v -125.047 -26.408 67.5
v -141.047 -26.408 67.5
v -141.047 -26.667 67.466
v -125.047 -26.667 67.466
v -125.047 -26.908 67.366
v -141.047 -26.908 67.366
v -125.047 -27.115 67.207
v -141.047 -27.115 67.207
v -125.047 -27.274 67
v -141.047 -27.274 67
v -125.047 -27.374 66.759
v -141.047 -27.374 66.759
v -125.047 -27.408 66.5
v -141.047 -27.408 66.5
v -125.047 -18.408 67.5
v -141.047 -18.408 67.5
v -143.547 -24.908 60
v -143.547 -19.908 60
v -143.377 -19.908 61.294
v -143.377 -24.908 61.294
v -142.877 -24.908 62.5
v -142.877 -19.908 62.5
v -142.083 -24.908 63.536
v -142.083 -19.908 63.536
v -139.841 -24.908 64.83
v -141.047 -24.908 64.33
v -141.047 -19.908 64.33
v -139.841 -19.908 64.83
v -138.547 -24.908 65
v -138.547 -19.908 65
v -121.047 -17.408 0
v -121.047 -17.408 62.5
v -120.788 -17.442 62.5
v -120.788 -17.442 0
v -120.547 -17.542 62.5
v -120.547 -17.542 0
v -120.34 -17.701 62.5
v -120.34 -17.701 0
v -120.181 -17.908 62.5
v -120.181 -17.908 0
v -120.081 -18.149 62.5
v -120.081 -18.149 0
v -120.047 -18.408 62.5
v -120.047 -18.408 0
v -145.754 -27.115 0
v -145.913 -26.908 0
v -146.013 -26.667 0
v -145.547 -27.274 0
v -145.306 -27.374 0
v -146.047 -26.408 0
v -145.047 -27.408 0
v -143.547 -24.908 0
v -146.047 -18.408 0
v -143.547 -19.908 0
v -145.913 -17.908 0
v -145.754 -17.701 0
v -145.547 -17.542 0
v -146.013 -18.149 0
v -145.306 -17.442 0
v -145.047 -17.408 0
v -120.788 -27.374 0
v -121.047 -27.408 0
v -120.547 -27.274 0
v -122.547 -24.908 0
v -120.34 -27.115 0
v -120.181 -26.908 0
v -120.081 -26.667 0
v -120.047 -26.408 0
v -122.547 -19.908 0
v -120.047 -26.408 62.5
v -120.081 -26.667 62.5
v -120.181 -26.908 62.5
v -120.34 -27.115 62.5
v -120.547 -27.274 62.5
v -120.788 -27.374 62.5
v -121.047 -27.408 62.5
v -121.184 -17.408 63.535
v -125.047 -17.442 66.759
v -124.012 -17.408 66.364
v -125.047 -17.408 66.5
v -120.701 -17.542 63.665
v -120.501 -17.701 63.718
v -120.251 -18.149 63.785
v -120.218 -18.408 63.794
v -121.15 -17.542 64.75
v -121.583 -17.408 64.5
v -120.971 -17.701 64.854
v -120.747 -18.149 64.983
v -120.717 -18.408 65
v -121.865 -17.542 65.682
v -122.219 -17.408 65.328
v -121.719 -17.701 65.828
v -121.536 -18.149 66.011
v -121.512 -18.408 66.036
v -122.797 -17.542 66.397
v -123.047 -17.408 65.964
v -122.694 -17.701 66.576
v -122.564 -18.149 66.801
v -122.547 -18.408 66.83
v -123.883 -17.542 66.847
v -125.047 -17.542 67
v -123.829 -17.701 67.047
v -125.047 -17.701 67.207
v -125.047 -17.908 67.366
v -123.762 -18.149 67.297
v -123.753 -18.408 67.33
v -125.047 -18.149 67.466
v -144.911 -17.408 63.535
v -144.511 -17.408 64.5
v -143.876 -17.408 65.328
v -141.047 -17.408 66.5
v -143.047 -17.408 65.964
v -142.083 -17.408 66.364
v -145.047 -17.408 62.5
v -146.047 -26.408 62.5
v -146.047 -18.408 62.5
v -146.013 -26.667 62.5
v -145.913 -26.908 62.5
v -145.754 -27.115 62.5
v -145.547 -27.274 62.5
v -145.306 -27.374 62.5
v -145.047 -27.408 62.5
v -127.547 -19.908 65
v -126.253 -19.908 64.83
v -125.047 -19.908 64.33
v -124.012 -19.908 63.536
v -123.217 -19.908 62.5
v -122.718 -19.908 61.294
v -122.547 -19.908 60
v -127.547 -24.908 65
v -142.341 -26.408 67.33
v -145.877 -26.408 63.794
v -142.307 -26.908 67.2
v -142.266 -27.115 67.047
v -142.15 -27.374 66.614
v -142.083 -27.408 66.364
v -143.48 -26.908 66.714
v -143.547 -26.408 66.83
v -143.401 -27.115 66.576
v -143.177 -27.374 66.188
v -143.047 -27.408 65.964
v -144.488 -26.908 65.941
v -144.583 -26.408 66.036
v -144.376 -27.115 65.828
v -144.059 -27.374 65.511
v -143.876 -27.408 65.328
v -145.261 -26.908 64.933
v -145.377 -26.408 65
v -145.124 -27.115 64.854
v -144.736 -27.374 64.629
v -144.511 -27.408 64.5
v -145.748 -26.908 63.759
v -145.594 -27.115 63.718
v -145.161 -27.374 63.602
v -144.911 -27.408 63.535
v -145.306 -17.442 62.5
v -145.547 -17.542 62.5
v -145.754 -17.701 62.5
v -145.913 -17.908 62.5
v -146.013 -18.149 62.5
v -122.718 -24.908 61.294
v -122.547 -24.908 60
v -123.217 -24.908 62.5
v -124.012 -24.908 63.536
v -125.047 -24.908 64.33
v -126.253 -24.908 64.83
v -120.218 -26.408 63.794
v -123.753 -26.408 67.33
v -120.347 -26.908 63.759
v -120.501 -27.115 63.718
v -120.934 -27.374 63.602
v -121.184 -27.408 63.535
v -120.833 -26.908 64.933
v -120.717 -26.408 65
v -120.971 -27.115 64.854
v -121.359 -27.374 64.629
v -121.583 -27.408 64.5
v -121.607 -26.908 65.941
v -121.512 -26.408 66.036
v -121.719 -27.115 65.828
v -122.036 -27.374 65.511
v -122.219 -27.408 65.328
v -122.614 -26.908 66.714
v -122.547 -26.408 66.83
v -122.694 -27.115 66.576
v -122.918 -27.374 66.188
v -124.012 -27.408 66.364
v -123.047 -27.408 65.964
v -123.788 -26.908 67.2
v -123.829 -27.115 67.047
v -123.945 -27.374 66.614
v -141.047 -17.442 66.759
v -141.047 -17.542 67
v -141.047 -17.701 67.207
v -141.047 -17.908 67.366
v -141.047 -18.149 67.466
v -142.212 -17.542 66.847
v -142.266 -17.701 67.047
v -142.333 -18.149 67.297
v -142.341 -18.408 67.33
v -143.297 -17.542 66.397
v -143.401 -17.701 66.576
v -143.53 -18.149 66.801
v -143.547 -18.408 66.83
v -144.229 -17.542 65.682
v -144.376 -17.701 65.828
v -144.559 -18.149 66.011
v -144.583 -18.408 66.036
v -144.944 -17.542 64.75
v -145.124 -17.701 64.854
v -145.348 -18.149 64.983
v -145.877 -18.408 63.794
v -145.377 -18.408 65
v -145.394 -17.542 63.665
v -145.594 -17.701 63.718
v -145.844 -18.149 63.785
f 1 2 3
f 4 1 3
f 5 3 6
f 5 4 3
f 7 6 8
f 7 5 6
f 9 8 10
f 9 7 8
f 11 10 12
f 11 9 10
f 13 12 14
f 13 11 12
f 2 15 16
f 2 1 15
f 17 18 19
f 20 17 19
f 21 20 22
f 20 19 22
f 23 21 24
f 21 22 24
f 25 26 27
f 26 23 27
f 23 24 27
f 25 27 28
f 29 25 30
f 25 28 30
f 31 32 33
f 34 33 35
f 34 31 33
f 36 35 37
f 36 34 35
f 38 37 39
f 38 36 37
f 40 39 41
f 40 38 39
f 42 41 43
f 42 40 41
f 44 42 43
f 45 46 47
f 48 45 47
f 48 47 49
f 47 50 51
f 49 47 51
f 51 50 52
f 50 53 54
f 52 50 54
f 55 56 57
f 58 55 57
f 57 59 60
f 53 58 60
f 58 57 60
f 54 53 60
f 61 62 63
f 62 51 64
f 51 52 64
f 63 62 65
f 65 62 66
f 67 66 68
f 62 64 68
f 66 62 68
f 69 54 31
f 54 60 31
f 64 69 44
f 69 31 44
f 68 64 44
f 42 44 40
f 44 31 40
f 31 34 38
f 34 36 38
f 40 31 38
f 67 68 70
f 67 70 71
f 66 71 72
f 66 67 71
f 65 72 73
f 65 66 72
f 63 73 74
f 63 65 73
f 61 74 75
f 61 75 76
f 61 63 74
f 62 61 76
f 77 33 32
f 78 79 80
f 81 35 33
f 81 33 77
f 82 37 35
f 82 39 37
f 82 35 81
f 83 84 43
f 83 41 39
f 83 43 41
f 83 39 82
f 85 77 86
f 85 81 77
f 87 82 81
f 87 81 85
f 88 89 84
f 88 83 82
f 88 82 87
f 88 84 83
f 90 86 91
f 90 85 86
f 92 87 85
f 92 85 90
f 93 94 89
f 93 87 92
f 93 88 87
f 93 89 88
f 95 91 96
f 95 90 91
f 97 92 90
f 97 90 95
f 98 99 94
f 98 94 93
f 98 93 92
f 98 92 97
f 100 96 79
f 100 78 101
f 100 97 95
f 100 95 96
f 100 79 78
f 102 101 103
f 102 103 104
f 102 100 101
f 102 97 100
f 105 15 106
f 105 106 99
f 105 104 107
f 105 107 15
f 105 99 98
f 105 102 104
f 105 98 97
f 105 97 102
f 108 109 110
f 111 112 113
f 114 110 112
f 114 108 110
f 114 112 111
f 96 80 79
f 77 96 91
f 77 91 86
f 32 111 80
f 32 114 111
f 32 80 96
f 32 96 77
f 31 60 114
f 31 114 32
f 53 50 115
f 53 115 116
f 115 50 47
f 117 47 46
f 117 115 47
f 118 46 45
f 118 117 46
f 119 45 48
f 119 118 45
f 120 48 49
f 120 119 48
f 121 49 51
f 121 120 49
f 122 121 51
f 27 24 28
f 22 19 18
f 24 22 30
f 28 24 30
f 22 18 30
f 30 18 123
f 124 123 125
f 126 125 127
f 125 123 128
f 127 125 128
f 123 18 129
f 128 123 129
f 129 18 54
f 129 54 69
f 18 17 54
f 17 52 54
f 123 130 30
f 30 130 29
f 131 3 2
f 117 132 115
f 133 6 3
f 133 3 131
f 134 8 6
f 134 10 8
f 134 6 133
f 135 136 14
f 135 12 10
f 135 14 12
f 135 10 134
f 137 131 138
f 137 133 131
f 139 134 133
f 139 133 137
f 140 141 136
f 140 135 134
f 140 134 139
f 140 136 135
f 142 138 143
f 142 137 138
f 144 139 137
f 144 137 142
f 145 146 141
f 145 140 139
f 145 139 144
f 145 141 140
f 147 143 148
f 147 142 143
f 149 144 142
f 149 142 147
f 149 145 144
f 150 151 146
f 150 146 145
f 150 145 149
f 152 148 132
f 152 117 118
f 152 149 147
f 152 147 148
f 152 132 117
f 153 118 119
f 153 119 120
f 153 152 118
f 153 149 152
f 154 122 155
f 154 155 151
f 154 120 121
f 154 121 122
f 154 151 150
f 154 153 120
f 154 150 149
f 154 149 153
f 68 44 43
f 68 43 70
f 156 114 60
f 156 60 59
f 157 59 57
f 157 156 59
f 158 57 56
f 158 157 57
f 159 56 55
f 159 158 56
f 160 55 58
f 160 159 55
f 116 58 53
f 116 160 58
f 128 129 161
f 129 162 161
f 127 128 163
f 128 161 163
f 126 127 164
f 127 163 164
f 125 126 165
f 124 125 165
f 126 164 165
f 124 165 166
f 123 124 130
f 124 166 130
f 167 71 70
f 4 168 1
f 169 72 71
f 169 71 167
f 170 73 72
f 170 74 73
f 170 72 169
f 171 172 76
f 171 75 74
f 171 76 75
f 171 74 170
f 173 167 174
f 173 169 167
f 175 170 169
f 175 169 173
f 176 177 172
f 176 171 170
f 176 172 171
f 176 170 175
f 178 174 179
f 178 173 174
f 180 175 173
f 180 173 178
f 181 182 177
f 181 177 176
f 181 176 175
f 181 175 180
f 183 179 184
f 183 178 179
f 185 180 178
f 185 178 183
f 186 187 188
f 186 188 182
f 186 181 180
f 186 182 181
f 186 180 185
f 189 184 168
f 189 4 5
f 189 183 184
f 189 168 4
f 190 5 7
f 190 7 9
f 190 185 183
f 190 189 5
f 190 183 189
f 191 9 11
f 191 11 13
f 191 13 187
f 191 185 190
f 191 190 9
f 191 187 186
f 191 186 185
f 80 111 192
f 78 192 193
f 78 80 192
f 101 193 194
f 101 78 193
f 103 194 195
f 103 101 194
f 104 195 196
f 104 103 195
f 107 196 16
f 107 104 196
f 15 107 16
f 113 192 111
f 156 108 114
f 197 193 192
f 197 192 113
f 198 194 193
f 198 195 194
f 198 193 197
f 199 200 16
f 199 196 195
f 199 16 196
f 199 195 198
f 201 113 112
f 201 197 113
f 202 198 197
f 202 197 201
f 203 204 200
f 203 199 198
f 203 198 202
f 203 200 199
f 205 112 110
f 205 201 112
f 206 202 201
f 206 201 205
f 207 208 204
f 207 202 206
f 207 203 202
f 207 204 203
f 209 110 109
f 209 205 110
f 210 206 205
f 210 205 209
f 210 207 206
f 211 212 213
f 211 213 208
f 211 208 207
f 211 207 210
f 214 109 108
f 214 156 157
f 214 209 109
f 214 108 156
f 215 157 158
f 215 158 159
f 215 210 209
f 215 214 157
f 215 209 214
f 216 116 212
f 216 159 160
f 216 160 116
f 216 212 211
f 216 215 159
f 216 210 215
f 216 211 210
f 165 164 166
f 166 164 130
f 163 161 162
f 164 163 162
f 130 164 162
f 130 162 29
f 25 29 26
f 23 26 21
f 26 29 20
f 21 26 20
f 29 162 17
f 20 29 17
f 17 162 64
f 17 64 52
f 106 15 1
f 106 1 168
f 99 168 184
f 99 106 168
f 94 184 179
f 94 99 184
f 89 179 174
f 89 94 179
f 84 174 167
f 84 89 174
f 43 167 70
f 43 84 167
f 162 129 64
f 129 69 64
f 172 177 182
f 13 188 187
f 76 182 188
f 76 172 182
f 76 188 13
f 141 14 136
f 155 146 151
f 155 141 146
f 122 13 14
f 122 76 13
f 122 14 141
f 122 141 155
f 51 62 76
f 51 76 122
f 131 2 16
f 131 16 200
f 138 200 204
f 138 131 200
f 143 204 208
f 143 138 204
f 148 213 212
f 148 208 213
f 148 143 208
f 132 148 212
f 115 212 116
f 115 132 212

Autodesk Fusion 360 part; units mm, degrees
sketch "草图1" plane through (0, 0, 0) normal (0, 0, 1) x (1, 0, 0)
  line L0 (-122.5473, -24.9077) -> (-143.5473, -24.9077)
  line L1 (-143.5473, -24.9077) -> (-143.5473, -19.9077)
  line L2 (-143.5473, -19.9077) -> (-122.5473, -19.9077)
  line L3 (-122.5473, -19.9077) -> (-122.5473, -24.9077)
  line L4 (-146.0473, -17.4077) -> (-120.0473, -17.4077)
  line L5 (-120.0473, -17.4077) -> (-120.0473, -27.4077)
  line L6 (-120.0473, -27.4077) -> (-146.0473, -27.4077)
  line L7 (-146.0473, -27.4077) -> (-146.0473, -17.4077)
  line L8 (-146.0473, -17.4077) -> (-120.0473, -27.4077) construction
  line L9 (-120.0473, -17.4077) -> (-146.0473, -27.4077) construction
  point P0 (-133.0473, -22.4077)
  dimension "d1" = 21
  dimension "d2" = 5
  dimension "d3" = 26
  dimension "d4" = 10
extrude "拉伸1" add sketch "草图1" along normal blind 65
sketch "草图2" plane through (0, 0, 65) normal (0, 0, 1) x (-1, 0, 0)
  line L0 (143.5473, 19.9077) -> (122.5473, 19.9077)
  line L1 (122.5473, 19.9077) -> (122.5473, 24.9077)
  line L2 (122.5473, 24.9077) -> (143.5473, 24.9077)
  line L3 (143.5473, 24.9077) -> (143.5473, 19.9077)
  line L4 (146.0473, 27.4077) -> (120.0473, 27.4077)
  line L5 (120.0473, 27.4077) -> (120.0473, 17.4077)
  line L6 (120.0473, 17.4077) -> (146.0473, 17.4077)
  line L7 (146.0473, 17.4077) -> (146.0473, 27.4077)
  line L8 (120.0473, 27.4077) -> (146.0473, 27.4077)
  line L9 (146.0473, 27.4077) -> (146.0473, 17.4077)
  line L10 (146.0473, 17.4077) -> (120.0473, 17.4077)
  line L11 (120.0473, 17.4077) -> (120.0473, 27.4077)
extrude "拉伸2" add sketch "草图2" along normal blind 2.5 contours L0 L1 L2 L3 | L4 L5 L6 L7 L8 L9 L10 L11
fillet "圆角1" radius 5 1 edges at (-122.5473, -22.4077, 65)
fillet "圆角2" radius 5 1 edges at (-143.5473, -22.4077, 65)
fillet "圆角3" radius 5 1 edges at (-120.0473, -22.4077, 67.5)
fillet "圆角4" radius 5 1 edges at (-146.0473, -22.4077, 67.5)
fillet "圆角5" radius 1 5 edges at (-120.0473, -17.4077, 31.25) (-121.5118, -17.4077, 66.0355) (-133.0473, -17.4077, 67.5) (-144.5829, -17.4077, 66.0355) (-146.0473, -17.4077, 31.25)
fillet "圆角6" radius 1 5 edges at (-146.0473, -27.4077, 31.25) (-144.5829, -27.4077, 66.0355) (-133.0473, -27.4077, 67.5) (-121.5118, -27.4077, 66.0355) (-120.0473, -27.4077, 31.25)
